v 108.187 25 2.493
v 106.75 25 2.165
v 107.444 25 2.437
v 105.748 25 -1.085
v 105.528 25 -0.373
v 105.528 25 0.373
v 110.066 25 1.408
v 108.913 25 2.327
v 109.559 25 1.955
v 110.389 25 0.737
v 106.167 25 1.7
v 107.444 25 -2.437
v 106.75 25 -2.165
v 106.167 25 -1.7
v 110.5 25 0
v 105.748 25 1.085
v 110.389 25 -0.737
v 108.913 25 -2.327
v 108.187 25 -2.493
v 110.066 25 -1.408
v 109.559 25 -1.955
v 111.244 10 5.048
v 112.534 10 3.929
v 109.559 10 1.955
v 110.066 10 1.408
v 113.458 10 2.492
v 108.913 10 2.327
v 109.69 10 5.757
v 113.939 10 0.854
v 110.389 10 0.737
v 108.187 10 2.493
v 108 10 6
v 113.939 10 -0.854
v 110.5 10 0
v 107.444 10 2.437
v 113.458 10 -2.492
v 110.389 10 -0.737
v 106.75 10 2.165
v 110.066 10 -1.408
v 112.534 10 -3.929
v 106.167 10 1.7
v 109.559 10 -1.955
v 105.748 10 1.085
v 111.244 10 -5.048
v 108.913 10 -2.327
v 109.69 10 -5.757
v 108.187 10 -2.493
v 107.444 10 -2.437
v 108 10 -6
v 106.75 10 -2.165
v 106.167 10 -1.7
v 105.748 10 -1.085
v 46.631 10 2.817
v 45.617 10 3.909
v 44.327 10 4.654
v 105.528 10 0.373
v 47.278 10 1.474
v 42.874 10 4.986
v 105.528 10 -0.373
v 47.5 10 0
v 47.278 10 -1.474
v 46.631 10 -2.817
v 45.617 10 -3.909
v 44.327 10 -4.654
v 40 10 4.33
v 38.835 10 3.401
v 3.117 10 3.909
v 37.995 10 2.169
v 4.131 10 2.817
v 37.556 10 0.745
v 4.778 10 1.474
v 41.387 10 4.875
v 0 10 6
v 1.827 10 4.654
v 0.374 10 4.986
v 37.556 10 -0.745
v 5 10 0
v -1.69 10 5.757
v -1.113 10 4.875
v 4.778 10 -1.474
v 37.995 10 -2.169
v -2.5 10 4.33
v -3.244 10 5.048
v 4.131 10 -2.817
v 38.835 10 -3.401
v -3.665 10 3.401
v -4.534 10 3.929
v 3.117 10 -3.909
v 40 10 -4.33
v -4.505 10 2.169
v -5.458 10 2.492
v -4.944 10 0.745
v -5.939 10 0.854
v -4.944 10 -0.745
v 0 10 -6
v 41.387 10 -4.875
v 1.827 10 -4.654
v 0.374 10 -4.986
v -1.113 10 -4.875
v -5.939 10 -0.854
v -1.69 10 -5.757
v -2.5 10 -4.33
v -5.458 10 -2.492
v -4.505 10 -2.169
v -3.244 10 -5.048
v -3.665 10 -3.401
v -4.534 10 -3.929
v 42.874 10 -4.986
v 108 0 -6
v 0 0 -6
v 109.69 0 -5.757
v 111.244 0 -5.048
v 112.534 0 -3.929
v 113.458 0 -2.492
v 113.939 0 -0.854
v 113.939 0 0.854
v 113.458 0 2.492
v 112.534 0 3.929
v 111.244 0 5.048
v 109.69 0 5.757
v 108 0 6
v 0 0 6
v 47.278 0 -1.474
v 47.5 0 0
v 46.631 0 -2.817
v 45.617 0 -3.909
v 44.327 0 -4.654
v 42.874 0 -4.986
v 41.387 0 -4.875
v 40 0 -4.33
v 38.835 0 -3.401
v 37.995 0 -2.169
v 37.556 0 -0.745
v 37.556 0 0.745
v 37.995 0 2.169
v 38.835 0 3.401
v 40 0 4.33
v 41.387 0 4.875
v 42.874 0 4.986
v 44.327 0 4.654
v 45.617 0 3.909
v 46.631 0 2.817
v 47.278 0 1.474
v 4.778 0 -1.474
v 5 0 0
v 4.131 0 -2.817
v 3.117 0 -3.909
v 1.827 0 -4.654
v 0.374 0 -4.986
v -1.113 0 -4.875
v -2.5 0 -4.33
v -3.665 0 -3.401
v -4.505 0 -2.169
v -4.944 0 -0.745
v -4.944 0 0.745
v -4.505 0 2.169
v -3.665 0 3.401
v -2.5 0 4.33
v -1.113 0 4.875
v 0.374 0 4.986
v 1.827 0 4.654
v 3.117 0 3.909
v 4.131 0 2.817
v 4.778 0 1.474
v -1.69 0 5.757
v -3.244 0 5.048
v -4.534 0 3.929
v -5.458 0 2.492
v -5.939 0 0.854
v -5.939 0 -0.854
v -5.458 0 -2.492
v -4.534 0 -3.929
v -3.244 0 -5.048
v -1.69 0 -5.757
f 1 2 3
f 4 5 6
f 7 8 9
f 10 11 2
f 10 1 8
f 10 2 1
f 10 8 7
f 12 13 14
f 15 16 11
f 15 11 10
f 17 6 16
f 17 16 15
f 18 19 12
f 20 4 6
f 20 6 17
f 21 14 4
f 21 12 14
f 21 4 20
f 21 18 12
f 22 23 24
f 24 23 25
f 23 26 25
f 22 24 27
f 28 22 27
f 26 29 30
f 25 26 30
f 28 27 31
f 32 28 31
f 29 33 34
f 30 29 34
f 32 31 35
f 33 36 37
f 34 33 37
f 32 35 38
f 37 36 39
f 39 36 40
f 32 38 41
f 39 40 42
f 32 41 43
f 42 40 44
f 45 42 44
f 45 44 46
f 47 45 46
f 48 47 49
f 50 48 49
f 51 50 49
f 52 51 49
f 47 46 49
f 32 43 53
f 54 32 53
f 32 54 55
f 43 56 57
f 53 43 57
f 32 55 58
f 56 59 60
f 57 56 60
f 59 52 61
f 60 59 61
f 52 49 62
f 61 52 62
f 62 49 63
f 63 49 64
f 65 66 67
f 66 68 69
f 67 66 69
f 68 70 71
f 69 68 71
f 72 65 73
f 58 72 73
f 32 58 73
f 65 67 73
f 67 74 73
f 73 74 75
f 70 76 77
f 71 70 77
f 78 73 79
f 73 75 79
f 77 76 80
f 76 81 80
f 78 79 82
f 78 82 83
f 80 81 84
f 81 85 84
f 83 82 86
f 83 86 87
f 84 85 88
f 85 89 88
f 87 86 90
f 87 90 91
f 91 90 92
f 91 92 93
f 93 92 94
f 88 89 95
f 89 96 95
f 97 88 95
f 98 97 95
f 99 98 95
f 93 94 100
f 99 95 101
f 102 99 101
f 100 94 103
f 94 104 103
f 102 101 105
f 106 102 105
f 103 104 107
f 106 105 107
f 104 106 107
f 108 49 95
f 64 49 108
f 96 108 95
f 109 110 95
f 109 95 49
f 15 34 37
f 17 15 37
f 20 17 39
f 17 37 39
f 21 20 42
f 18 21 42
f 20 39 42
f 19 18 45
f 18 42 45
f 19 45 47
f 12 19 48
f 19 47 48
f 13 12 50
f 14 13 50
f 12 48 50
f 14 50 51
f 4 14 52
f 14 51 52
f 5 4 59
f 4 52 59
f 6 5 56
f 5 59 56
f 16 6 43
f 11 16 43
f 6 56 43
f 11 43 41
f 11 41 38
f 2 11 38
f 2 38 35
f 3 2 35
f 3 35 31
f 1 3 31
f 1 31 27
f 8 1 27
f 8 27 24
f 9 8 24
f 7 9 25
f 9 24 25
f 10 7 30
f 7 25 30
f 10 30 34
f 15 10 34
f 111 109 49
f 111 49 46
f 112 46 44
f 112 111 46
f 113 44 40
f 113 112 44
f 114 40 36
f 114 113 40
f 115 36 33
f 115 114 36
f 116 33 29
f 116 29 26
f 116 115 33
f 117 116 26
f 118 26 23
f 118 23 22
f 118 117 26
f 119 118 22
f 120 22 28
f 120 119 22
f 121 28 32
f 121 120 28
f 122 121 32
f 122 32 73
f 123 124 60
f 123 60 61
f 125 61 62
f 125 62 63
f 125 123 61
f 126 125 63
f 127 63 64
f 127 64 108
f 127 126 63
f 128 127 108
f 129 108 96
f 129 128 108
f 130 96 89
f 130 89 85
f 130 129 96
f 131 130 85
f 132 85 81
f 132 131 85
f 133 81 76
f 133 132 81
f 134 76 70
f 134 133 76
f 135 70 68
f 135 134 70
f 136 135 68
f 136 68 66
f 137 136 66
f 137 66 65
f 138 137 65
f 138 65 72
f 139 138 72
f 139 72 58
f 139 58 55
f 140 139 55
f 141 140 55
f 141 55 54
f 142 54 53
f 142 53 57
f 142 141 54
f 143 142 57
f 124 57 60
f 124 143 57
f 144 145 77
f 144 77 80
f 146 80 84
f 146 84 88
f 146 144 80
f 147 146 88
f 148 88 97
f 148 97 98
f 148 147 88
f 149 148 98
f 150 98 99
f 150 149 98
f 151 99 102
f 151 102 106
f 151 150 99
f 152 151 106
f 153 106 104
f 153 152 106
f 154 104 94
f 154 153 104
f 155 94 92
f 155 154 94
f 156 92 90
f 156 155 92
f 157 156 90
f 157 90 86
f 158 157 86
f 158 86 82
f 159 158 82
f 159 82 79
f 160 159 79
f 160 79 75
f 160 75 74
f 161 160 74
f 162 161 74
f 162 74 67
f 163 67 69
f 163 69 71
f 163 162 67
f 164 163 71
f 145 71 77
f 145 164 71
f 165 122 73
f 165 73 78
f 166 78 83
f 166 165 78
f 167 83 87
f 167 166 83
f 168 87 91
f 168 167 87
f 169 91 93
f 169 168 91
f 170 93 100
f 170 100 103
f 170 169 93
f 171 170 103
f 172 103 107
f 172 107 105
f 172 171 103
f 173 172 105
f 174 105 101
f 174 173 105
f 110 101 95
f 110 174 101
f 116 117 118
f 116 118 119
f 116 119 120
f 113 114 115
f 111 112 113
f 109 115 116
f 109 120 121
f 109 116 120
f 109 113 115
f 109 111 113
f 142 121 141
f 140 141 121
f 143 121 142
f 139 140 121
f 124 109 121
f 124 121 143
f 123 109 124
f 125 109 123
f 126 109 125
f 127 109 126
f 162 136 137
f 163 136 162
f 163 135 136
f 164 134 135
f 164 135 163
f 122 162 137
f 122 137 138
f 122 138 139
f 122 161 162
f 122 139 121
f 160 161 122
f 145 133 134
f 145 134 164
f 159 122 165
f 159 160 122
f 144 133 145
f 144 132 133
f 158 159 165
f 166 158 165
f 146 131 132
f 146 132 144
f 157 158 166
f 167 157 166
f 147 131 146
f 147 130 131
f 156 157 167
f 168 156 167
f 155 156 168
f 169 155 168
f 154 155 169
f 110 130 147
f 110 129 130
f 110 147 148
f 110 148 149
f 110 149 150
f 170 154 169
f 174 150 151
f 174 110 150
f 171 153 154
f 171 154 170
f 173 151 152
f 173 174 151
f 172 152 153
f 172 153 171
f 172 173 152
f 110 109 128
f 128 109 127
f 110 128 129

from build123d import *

# Parameters (mm, degrees)
SKETCH1_R           = 5
BOSS_EXTRUDE1_DEPTH = 10
SKETCH2_R           = 2.5
BOSS_EXTRUDE2_DEPTH = 15


with BuildPart() as part:
    # Sketch1 → Boss-Extrude1 (new body)
    with BuildSketch(Plane(origin=(0, 0, 0), x_dir=(1, 0, 0), z_dir=(0, 1, 0))):
        with BuildLine():
            Line((0, 6), (108, 6))
            ThreePointArc((108, 6), (114, 0), (108, -6))
            Line((108, -6), (0, -6))
            ThreePointArc((0, -6), (-6, 0), (0, 6))
        make_face()
        Circle(SKETCH1_R, mode=Mode.SUBTRACT)
        with Locations((42.5, 0)):
            Circle(SKETCH1_R, mode=Mode.SUBTRACT)
    extrude(amount=BOSS_EXTRUDE1_DEPTH)

    # Sketch2 → Boss-Extrude2 (add)
    with BuildSketch(Plane(origin=(0, 10, 0), x_dir=(1, 0, 0), z_dir=(0, 1, 0))):
        with Locations((108, 0)):
            Circle(SKETCH2_R)
    extrude(amount=BOSS_EXTRUDE2_DEPTH)


solid = part.part
